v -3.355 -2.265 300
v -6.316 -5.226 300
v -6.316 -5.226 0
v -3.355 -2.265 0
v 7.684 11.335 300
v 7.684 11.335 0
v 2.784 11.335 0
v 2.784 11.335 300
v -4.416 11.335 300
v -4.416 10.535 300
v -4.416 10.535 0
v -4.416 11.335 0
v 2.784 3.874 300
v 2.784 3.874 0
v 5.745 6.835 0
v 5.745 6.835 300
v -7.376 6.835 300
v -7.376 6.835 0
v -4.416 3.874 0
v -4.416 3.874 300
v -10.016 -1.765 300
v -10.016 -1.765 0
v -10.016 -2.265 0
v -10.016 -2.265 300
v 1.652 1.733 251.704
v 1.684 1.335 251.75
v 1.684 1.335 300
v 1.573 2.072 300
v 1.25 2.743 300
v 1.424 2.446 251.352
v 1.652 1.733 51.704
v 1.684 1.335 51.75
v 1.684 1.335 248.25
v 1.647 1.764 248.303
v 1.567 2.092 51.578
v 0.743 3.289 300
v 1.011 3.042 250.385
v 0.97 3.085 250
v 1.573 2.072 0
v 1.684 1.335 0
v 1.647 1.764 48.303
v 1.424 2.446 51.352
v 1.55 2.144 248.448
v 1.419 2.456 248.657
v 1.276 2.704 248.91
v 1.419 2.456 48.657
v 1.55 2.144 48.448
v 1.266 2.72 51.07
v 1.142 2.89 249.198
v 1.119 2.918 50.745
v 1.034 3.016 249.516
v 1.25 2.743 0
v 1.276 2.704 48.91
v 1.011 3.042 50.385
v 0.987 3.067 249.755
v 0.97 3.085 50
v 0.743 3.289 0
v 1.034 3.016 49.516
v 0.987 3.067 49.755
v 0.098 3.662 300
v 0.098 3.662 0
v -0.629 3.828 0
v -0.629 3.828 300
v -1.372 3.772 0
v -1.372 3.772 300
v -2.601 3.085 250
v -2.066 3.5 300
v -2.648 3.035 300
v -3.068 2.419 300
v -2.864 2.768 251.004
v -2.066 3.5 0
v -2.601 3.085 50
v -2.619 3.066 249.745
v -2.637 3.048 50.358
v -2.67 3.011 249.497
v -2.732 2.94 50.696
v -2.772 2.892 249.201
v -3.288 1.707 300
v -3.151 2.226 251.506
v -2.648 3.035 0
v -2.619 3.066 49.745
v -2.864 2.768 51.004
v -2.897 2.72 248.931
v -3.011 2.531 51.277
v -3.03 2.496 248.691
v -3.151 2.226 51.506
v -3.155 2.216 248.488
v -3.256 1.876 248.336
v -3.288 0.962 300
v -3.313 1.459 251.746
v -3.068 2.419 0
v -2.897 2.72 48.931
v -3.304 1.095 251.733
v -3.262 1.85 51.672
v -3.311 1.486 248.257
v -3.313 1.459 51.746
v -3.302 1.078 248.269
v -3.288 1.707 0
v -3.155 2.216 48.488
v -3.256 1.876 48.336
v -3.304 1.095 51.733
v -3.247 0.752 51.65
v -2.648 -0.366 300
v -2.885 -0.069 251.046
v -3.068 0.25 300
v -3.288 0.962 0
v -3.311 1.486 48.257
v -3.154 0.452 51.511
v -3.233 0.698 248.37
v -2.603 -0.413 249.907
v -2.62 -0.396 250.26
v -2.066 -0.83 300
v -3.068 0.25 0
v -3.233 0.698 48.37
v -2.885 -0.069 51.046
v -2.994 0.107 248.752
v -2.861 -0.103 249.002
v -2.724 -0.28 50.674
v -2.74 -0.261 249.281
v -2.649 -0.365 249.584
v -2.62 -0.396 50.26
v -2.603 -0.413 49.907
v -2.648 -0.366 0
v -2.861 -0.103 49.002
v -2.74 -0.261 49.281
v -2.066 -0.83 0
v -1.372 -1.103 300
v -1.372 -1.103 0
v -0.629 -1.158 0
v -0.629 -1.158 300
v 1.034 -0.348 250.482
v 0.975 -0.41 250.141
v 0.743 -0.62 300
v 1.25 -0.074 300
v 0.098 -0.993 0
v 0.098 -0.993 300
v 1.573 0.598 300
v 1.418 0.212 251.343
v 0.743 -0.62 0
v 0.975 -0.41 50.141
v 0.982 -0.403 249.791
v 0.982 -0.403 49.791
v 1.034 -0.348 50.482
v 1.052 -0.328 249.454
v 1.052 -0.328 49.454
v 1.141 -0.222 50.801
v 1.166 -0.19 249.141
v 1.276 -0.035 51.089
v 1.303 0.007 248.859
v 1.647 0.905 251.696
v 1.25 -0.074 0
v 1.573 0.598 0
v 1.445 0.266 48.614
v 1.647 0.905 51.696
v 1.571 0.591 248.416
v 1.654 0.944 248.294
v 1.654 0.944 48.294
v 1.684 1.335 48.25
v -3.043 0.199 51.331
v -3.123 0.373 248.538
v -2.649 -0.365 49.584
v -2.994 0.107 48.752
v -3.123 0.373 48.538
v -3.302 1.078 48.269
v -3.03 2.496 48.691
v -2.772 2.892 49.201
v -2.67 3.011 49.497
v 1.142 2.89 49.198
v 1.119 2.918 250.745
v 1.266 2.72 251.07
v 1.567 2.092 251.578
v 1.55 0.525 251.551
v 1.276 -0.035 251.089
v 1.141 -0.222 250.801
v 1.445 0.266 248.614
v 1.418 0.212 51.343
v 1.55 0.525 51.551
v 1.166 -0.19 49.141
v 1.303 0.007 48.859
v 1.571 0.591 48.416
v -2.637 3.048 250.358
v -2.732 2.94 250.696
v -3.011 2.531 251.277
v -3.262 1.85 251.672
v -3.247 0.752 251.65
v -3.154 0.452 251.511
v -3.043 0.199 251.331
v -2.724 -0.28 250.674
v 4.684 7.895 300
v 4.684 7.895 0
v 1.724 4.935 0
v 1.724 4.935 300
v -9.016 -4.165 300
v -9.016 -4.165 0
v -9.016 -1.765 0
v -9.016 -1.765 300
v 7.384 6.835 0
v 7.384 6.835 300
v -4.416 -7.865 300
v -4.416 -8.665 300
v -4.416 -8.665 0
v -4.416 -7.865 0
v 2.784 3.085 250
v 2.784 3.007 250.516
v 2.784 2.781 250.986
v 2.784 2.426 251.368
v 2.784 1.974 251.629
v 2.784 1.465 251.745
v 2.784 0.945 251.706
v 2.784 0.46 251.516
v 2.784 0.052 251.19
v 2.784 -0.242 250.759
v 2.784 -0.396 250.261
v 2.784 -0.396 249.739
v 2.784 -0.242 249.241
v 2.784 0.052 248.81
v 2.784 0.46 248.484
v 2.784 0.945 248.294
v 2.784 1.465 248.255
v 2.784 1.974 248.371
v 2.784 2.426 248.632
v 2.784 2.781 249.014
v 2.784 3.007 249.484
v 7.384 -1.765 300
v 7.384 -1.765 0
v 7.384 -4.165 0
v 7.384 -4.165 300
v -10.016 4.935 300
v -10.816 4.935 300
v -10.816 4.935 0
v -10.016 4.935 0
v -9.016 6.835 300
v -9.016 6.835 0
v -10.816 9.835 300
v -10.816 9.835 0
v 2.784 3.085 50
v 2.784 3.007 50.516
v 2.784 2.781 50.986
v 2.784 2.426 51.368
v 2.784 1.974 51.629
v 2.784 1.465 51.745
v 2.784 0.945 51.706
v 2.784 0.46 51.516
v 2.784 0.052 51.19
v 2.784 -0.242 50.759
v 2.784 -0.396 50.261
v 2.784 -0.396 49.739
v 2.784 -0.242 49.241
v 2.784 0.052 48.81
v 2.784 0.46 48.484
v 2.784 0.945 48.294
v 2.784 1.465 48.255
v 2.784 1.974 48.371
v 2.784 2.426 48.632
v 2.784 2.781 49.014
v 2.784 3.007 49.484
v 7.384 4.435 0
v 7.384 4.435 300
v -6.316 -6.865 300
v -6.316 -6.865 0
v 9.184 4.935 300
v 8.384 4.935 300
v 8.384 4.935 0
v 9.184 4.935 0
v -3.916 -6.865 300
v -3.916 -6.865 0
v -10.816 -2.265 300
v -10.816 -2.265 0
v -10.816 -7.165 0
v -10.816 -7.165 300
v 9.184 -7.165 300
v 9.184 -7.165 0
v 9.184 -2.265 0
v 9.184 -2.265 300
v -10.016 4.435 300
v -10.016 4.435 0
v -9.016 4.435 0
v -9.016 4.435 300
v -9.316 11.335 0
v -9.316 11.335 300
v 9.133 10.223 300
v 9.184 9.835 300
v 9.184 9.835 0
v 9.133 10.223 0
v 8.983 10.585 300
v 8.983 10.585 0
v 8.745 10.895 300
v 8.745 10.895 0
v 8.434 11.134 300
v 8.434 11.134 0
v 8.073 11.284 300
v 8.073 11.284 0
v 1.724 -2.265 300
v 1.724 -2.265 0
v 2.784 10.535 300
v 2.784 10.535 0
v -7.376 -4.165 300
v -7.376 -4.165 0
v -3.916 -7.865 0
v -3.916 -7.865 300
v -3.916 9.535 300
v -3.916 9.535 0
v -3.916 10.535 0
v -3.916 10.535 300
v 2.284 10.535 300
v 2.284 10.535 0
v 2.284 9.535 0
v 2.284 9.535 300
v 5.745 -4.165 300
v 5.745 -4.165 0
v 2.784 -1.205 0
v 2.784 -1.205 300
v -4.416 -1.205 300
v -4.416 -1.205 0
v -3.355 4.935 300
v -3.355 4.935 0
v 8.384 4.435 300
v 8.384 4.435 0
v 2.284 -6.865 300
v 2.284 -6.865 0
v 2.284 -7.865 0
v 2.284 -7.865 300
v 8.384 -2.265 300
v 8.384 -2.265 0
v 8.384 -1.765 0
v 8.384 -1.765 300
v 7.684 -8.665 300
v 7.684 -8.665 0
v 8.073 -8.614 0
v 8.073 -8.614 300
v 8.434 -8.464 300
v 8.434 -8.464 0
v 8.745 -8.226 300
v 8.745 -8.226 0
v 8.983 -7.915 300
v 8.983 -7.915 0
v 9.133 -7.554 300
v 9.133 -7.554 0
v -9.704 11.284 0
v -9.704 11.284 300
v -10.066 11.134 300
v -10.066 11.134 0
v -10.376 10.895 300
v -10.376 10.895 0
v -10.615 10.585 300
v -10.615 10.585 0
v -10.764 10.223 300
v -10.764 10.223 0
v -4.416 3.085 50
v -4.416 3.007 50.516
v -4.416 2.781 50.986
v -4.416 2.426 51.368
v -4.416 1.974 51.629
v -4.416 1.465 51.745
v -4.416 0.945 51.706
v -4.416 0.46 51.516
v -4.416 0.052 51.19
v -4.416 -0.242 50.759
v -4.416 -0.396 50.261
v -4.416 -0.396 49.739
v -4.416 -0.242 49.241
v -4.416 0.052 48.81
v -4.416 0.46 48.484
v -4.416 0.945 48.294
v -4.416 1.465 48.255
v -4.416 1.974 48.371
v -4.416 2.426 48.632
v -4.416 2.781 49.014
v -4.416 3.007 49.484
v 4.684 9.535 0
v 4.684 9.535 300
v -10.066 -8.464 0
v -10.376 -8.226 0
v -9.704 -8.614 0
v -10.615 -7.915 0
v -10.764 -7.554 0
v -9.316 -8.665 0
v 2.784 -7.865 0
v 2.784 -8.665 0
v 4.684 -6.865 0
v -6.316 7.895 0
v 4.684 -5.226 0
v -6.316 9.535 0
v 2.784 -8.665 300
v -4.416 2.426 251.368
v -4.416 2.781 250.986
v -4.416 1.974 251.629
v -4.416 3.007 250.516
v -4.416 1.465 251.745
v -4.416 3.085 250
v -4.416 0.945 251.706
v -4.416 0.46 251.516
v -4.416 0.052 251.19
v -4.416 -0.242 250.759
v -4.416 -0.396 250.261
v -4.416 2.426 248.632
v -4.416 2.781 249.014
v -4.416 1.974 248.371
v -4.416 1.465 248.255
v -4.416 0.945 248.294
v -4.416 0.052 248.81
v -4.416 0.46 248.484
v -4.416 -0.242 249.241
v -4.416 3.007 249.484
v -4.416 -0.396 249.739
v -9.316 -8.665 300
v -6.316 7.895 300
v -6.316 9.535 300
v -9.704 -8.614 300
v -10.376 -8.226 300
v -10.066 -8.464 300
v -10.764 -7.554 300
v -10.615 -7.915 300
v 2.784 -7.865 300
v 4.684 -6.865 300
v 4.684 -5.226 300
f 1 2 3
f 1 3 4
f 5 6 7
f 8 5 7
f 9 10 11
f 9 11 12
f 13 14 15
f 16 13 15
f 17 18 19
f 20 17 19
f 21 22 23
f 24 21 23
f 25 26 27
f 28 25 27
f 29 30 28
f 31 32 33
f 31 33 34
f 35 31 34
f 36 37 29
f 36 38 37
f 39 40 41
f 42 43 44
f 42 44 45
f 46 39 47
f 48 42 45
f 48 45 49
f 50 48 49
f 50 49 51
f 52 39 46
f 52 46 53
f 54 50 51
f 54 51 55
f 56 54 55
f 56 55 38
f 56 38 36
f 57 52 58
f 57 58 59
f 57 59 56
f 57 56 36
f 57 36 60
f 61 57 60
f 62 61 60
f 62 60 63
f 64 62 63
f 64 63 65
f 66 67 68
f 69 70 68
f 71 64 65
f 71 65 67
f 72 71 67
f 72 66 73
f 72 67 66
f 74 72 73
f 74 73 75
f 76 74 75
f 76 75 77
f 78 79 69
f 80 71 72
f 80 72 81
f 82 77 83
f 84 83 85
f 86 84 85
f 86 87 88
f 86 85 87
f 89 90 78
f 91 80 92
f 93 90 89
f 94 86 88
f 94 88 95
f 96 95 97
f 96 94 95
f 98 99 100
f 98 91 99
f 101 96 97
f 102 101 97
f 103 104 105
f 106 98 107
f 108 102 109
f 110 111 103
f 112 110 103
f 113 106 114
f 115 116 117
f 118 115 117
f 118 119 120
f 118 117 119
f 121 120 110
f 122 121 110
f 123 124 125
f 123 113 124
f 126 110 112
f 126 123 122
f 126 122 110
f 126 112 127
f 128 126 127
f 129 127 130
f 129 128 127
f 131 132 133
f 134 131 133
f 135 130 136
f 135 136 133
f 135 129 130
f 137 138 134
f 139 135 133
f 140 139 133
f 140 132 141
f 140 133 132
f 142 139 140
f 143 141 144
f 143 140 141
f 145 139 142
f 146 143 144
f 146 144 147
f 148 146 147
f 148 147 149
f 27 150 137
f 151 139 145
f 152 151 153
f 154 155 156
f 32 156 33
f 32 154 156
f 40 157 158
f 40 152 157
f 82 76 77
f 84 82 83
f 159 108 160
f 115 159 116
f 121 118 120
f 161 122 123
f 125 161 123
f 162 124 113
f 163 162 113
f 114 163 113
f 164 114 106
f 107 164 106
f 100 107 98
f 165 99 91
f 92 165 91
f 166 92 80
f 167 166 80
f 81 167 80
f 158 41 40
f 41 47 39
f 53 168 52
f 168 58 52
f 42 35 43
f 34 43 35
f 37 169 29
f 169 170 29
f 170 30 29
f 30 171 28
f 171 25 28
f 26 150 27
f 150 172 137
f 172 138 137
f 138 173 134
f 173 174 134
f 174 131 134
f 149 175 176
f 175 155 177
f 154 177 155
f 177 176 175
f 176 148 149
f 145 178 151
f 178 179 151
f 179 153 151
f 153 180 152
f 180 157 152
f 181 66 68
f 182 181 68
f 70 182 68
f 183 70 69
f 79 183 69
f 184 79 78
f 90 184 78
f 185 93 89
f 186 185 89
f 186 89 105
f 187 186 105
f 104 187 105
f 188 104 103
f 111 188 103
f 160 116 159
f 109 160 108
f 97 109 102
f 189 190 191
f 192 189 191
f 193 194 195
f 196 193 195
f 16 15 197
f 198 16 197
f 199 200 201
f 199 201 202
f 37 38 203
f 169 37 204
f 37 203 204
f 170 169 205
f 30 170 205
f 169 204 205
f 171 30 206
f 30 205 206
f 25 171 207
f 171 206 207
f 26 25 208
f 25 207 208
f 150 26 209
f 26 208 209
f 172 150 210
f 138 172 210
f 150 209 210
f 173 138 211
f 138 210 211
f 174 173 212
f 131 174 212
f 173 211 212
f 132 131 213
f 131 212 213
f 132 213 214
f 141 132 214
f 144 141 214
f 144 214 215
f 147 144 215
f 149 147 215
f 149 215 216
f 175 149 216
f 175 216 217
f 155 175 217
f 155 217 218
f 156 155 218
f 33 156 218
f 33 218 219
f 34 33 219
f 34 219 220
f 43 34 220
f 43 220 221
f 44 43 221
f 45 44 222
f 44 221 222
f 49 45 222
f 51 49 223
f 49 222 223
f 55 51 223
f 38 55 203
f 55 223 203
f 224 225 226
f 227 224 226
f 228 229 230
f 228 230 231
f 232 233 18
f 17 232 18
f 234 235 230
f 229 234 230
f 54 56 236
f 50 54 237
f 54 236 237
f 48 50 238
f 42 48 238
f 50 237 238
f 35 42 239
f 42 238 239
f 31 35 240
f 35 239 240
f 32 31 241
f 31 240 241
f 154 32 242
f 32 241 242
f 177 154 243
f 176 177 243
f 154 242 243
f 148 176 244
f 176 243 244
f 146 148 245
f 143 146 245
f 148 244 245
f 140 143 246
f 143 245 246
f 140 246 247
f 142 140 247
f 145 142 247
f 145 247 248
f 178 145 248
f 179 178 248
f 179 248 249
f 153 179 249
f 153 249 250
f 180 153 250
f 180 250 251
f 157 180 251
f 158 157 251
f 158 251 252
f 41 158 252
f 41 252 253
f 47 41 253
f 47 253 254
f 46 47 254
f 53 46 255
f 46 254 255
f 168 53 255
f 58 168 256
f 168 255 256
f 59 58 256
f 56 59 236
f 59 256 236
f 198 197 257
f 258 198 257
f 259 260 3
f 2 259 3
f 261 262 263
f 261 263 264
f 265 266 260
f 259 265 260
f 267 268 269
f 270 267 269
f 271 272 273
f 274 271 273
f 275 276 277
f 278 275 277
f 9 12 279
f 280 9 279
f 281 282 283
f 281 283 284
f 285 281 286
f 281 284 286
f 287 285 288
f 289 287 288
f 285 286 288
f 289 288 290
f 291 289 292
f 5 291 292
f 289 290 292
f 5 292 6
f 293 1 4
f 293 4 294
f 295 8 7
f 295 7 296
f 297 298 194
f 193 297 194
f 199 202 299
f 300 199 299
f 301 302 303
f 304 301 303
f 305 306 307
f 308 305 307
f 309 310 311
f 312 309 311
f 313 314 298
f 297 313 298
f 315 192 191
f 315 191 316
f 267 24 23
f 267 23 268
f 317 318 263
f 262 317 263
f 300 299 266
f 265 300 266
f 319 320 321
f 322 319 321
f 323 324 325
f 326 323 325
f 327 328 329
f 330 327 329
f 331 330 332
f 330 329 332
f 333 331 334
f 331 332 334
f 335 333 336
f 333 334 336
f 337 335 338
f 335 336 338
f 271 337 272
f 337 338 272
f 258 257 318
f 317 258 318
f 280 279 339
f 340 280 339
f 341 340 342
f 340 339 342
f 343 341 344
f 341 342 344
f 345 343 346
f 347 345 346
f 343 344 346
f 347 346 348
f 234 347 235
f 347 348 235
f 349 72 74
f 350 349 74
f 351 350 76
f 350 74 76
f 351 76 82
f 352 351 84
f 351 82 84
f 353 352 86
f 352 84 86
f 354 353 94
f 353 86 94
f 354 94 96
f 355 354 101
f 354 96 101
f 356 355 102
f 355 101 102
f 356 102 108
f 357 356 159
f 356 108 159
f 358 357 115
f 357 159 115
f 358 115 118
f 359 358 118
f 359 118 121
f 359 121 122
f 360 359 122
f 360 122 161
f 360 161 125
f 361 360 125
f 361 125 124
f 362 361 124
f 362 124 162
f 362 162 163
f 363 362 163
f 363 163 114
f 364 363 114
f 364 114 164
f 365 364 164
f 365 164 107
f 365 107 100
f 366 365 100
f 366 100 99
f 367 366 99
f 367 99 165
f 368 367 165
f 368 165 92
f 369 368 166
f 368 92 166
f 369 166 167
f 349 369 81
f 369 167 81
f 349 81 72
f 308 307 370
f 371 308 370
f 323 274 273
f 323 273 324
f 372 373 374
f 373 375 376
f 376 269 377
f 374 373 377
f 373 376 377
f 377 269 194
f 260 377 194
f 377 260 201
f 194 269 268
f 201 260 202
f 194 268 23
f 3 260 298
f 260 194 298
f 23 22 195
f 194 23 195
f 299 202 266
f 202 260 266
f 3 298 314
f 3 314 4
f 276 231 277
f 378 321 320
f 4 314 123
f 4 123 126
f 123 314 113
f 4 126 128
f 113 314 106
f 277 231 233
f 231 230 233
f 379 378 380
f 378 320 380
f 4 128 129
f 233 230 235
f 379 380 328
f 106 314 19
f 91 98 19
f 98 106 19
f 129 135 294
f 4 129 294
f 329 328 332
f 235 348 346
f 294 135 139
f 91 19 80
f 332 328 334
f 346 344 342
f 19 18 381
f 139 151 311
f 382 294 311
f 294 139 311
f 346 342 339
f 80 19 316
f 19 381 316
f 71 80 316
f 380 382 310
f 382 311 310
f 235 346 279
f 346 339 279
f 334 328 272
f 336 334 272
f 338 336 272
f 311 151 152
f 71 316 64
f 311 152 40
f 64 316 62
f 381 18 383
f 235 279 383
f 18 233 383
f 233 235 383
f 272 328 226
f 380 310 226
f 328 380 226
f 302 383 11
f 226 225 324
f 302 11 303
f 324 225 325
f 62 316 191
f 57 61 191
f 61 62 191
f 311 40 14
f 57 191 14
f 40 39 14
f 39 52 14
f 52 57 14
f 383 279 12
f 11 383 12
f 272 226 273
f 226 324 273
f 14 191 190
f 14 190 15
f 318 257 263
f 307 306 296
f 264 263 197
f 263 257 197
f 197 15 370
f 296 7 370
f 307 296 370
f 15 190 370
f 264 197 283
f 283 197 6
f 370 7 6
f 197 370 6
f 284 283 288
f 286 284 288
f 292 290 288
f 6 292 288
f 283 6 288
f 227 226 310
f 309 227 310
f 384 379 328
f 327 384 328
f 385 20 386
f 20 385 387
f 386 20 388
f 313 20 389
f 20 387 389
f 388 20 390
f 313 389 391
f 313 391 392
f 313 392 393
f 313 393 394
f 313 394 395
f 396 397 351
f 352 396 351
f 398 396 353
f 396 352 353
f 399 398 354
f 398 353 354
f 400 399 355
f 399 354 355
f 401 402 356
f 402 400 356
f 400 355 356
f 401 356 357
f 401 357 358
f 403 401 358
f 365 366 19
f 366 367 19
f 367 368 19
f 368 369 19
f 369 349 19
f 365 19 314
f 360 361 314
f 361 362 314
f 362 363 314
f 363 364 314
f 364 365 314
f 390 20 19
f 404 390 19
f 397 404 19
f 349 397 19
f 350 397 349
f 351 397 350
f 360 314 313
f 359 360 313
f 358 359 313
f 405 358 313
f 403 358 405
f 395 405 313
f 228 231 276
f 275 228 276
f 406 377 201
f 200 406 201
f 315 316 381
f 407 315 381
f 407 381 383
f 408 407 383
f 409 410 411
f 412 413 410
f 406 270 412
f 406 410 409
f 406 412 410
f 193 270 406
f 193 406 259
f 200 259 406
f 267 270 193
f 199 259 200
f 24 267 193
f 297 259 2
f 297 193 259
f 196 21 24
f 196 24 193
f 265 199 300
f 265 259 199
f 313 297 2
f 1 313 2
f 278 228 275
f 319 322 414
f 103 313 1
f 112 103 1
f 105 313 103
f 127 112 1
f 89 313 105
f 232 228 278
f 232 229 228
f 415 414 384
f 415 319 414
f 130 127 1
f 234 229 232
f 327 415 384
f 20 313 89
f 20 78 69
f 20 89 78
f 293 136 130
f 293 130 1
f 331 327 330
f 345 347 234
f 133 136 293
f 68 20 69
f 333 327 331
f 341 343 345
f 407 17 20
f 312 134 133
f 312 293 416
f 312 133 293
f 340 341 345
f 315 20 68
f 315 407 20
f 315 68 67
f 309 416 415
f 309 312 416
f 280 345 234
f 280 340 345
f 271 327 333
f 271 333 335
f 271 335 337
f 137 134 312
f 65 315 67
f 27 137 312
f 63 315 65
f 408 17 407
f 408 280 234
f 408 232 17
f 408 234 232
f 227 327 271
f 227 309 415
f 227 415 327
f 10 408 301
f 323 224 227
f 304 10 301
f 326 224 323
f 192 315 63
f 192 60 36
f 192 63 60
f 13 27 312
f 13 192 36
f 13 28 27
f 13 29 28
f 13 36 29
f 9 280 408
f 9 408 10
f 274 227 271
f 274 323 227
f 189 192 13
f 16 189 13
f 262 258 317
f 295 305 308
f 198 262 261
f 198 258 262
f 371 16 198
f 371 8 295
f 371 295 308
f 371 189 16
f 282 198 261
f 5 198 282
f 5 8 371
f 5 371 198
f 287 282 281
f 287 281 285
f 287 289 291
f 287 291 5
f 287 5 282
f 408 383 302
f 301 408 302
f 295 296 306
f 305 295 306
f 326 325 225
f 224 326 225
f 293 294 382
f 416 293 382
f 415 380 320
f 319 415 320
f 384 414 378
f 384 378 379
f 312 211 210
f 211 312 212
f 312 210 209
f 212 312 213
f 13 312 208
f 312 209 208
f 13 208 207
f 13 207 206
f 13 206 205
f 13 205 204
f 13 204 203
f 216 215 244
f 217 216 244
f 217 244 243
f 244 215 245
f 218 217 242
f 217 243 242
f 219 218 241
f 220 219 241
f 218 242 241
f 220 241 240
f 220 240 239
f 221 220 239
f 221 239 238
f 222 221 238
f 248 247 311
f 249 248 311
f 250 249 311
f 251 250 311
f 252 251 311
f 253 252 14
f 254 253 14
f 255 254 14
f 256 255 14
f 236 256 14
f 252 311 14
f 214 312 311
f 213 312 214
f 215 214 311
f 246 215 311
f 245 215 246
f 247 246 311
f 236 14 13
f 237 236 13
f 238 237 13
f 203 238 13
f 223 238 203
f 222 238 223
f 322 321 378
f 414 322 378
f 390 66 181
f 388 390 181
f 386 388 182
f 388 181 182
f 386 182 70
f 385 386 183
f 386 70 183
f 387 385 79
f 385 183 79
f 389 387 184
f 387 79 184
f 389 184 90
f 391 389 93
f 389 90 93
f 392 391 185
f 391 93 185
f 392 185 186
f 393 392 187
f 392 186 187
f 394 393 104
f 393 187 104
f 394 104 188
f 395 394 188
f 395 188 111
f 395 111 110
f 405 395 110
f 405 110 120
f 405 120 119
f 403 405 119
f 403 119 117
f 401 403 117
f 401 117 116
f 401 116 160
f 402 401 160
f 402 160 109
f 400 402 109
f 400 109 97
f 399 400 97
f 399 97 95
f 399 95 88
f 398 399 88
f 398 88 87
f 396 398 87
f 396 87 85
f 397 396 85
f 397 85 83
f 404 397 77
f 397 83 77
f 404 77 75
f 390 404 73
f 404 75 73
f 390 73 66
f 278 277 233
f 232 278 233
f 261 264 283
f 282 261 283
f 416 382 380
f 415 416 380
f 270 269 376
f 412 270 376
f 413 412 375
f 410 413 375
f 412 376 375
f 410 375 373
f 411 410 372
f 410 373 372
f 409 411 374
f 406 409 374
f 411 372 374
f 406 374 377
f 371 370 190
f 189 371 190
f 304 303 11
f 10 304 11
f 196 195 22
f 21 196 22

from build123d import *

# Parameters (mm, degrees)
SKETCH_1_R          = 2.5
EXTRUDE_1_DEPTH     = 300
SKETCH_2_R          = 1.75
CUT_EXTRUDE_1_DEPTH = 39


with BuildPart() as part:
    # 草图1 → 凸台-拉伸1 (new body)
    with BuildSketch(Plane.XY):
        with BuildLine():
            Line((-4.415608984, 3.873972711), (-4.415608984, -1.204706946))
            Line((-4.415608984, -1.204706946), (-7.376269156, -4.165367117))
            Line((-7.376269156, -4.165367117), (-9.015608984, -4.165367117))
            Line((-9.015608984, -4.165367117), (-9.015608984, -1.765367117))
            Line((-9.015608984, -1.765367117), (-10.015608984, -1.765367117))
            Line((-10.015608984, -1.765367117), (-10.015608984, -2.265367117))
            Line((-10.015608984, -2.265367117), (-10.815608984, -2.265367117))
            Line((-10.815608984, -2.265367117), (-10.815608984, -7.165367117))
            ThreePointArc((-10.815608984, -7.165367117), (-10.376269156, -8.226027289), (-9.315608984, -8.665367117))
            Line((-9.315608984, -8.665367117), (-4.415608984, -8.665367117))
            Line((-4.415608984, -8.665367117), (-4.415608984, -7.865367117))
            Line((-4.415608984, -7.865367117), (-3.915608984, -7.865367117))
            Line((-3.915608984, -7.865367117), (-3.915608984, -6.865367117))
            Line((-3.915608984, -6.865367117), (-6.315608984, -6.865367117))
            Line((-6.315608984, -6.865367117), (-6.315608984, -5.226027289))
            Line((-6.315608984, -5.226027289), (-3.354948812, -2.265367117))
            Line((-3.354948812, -2.265367117), (1.723730844, -2.265367117))
            Line((1.723730844, -2.265367117), (4.684391016, -5.226027289))
            Line((4.684391016, -5.226027289), (4.684391016, -6.865367117))
            Line((4.684391016, -6.865367117), (2.284391016, -6.865367117))
            Line((2.284391016, -6.865367117), (2.284391016, -7.865367117))
            Line((2.284391016, -7.865367117), (2.784391016, -7.865367117))
            Line((2.784391016, -7.865367117), (2.784391016, -8.665367117))
            Line((2.784391016, -8.665367117), (7.684391016, -8.665367117))
            ThreePointArc((7.684391016, -8.665367117), (8.745051188, -8.226027289), (9.184391016, -7.165367117))
            Line((9.184391016, -7.165367117), (9.184391016, -2.265367117))
            Line((9.184391016, -2.265367117), (8.384391016, -2.265367117))
            Line((8.384391016, -2.265367117), (8.384391016, -1.765367117))
            Line((8.384391016, -1.765367117), (7.384391016, -1.765367117))
            Line((7.384391016, -1.765367117), (7.384391016, -4.165367117))
            Line((7.384391016, -4.165367117), (5.745051188, -4.165367117))
            Line((5.745051188, -4.165367117), (2.784391016, -1.204706946))
            Line((2.784391016, -1.204706946), (2.784391016, 3.873972711))
            Line((2.784391016, 3.873972711), (5.745051188, 6.834632883))
            Line((5.745051188, 6.834632883), (7.384391016, 6.834632883))
            Line((7.384391016, 6.834632883), (7.384391016, 4.434632883))
            Line((7.384391016, 4.434632883), (8.384391016, 4.434632883))
            Line((8.384391016, 4.434632883), (8.384391016, 4.934632883))
            Line((8.384391016, 4.934632883), (9.184391016, 4.934632883))
            Line((9.184391016, 4.934632883), (9.184391016, 9.834632883))
            ThreePointArc((9.184391016, 9.834632883), (8.745051188, 10.895293054), (7.684391016, 11.334632883))
            Line((7.684391016, 11.334632883), (2.784391016, 11.334632883))
            Line((2.784391016, 11.334632883), (2.784391016, 10.534632883))
            Line((2.784391016, 10.534632883), (2.284391016, 10.534632883))
            Line((2.284391016, 10.534632883), (2.284391016, 9.534632883))
            Line((2.284391016, 9.534632883), (4.684391016, 9.534632883))
            Line((4.684391016, 9.534632883), (4.684391016, 7.895293054))
            Line((4.684391016, 7.895293054), (1.723730844, 4.934632883))
            Line((1.723730844, 4.934632883), (-3.354948812, 4.934632883))
            Line((-3.354948812, 4.934632883), (-6.315608984, 7.895293054))
            Line((-6.315608984, 7.895293054), (-6.315608984, 9.534632883))
            Line((-6.315608984, 9.534632883), (-3.915608984, 9.534632883))
            Line((-3.915608984, 9.534632883), (-3.915608984, 10.534632883))
            Line((-3.915608984, 10.534632883), (-4.415608984, 10.534632883))
            Line((-4.415608984, 10.534632883), (-4.415608984, 11.334632883))
            Line((-4.415608984, 11.334632883), (-9.315608984, 11.334632883))
            ThreePointArc((-9.315608984, 11.334632883), (-10.376269156, 10.895293054), (-10.815608984, 9.834632883))
            Line((-10.815608984, 9.834632883), (-10.815608984, 4.934632883))
            Line((-10.815608984, 4.934632883), (-10.015608984, 4.934632883))
            Line((-10.015608984, 4.934632883), (-10.015608984, 4.434632883))
            Line((-10.015608984, 4.434632883), (-9.015608984, 4.434632883))
            Line((-9.015608984, 4.434632883), (-9.015608984, 6.834632883))
            Line((-9.015608984, 6.834632883), (-7.376269156, 6.834632883))
            Line((-7.376269156, 6.834632883), (-4.415608984, 3.873972711))
        make_face()
        with Locations((-0.815608984, 1.334632883)):
            Circle(SKETCH_1_R, mode=Mode.SUBTRACT)
    extrude(amount=EXTRUDE_1_DEPTH)

    # 草图2 → 切除-拉伸1 (cut)
    with BuildSketch(Plane(origin=(2.784391016, 0, 0), x_dir=(0, 0, -1), z_dir=(1, 0, 0))):
        with Locations(Location((-250, 1.334632883, 0), (0, 0, 90))):
            Circle(SKETCH_2_R)
        with Locations(Location((-50, 1.334632883, 0), (0, 0, 90))):
            Circle(SKETCH_2_R)
    extrude(amount=-CUT_EXTRUDE_1_DEPTH, mode=Mode.SUBTRACT)


solid = part.part
